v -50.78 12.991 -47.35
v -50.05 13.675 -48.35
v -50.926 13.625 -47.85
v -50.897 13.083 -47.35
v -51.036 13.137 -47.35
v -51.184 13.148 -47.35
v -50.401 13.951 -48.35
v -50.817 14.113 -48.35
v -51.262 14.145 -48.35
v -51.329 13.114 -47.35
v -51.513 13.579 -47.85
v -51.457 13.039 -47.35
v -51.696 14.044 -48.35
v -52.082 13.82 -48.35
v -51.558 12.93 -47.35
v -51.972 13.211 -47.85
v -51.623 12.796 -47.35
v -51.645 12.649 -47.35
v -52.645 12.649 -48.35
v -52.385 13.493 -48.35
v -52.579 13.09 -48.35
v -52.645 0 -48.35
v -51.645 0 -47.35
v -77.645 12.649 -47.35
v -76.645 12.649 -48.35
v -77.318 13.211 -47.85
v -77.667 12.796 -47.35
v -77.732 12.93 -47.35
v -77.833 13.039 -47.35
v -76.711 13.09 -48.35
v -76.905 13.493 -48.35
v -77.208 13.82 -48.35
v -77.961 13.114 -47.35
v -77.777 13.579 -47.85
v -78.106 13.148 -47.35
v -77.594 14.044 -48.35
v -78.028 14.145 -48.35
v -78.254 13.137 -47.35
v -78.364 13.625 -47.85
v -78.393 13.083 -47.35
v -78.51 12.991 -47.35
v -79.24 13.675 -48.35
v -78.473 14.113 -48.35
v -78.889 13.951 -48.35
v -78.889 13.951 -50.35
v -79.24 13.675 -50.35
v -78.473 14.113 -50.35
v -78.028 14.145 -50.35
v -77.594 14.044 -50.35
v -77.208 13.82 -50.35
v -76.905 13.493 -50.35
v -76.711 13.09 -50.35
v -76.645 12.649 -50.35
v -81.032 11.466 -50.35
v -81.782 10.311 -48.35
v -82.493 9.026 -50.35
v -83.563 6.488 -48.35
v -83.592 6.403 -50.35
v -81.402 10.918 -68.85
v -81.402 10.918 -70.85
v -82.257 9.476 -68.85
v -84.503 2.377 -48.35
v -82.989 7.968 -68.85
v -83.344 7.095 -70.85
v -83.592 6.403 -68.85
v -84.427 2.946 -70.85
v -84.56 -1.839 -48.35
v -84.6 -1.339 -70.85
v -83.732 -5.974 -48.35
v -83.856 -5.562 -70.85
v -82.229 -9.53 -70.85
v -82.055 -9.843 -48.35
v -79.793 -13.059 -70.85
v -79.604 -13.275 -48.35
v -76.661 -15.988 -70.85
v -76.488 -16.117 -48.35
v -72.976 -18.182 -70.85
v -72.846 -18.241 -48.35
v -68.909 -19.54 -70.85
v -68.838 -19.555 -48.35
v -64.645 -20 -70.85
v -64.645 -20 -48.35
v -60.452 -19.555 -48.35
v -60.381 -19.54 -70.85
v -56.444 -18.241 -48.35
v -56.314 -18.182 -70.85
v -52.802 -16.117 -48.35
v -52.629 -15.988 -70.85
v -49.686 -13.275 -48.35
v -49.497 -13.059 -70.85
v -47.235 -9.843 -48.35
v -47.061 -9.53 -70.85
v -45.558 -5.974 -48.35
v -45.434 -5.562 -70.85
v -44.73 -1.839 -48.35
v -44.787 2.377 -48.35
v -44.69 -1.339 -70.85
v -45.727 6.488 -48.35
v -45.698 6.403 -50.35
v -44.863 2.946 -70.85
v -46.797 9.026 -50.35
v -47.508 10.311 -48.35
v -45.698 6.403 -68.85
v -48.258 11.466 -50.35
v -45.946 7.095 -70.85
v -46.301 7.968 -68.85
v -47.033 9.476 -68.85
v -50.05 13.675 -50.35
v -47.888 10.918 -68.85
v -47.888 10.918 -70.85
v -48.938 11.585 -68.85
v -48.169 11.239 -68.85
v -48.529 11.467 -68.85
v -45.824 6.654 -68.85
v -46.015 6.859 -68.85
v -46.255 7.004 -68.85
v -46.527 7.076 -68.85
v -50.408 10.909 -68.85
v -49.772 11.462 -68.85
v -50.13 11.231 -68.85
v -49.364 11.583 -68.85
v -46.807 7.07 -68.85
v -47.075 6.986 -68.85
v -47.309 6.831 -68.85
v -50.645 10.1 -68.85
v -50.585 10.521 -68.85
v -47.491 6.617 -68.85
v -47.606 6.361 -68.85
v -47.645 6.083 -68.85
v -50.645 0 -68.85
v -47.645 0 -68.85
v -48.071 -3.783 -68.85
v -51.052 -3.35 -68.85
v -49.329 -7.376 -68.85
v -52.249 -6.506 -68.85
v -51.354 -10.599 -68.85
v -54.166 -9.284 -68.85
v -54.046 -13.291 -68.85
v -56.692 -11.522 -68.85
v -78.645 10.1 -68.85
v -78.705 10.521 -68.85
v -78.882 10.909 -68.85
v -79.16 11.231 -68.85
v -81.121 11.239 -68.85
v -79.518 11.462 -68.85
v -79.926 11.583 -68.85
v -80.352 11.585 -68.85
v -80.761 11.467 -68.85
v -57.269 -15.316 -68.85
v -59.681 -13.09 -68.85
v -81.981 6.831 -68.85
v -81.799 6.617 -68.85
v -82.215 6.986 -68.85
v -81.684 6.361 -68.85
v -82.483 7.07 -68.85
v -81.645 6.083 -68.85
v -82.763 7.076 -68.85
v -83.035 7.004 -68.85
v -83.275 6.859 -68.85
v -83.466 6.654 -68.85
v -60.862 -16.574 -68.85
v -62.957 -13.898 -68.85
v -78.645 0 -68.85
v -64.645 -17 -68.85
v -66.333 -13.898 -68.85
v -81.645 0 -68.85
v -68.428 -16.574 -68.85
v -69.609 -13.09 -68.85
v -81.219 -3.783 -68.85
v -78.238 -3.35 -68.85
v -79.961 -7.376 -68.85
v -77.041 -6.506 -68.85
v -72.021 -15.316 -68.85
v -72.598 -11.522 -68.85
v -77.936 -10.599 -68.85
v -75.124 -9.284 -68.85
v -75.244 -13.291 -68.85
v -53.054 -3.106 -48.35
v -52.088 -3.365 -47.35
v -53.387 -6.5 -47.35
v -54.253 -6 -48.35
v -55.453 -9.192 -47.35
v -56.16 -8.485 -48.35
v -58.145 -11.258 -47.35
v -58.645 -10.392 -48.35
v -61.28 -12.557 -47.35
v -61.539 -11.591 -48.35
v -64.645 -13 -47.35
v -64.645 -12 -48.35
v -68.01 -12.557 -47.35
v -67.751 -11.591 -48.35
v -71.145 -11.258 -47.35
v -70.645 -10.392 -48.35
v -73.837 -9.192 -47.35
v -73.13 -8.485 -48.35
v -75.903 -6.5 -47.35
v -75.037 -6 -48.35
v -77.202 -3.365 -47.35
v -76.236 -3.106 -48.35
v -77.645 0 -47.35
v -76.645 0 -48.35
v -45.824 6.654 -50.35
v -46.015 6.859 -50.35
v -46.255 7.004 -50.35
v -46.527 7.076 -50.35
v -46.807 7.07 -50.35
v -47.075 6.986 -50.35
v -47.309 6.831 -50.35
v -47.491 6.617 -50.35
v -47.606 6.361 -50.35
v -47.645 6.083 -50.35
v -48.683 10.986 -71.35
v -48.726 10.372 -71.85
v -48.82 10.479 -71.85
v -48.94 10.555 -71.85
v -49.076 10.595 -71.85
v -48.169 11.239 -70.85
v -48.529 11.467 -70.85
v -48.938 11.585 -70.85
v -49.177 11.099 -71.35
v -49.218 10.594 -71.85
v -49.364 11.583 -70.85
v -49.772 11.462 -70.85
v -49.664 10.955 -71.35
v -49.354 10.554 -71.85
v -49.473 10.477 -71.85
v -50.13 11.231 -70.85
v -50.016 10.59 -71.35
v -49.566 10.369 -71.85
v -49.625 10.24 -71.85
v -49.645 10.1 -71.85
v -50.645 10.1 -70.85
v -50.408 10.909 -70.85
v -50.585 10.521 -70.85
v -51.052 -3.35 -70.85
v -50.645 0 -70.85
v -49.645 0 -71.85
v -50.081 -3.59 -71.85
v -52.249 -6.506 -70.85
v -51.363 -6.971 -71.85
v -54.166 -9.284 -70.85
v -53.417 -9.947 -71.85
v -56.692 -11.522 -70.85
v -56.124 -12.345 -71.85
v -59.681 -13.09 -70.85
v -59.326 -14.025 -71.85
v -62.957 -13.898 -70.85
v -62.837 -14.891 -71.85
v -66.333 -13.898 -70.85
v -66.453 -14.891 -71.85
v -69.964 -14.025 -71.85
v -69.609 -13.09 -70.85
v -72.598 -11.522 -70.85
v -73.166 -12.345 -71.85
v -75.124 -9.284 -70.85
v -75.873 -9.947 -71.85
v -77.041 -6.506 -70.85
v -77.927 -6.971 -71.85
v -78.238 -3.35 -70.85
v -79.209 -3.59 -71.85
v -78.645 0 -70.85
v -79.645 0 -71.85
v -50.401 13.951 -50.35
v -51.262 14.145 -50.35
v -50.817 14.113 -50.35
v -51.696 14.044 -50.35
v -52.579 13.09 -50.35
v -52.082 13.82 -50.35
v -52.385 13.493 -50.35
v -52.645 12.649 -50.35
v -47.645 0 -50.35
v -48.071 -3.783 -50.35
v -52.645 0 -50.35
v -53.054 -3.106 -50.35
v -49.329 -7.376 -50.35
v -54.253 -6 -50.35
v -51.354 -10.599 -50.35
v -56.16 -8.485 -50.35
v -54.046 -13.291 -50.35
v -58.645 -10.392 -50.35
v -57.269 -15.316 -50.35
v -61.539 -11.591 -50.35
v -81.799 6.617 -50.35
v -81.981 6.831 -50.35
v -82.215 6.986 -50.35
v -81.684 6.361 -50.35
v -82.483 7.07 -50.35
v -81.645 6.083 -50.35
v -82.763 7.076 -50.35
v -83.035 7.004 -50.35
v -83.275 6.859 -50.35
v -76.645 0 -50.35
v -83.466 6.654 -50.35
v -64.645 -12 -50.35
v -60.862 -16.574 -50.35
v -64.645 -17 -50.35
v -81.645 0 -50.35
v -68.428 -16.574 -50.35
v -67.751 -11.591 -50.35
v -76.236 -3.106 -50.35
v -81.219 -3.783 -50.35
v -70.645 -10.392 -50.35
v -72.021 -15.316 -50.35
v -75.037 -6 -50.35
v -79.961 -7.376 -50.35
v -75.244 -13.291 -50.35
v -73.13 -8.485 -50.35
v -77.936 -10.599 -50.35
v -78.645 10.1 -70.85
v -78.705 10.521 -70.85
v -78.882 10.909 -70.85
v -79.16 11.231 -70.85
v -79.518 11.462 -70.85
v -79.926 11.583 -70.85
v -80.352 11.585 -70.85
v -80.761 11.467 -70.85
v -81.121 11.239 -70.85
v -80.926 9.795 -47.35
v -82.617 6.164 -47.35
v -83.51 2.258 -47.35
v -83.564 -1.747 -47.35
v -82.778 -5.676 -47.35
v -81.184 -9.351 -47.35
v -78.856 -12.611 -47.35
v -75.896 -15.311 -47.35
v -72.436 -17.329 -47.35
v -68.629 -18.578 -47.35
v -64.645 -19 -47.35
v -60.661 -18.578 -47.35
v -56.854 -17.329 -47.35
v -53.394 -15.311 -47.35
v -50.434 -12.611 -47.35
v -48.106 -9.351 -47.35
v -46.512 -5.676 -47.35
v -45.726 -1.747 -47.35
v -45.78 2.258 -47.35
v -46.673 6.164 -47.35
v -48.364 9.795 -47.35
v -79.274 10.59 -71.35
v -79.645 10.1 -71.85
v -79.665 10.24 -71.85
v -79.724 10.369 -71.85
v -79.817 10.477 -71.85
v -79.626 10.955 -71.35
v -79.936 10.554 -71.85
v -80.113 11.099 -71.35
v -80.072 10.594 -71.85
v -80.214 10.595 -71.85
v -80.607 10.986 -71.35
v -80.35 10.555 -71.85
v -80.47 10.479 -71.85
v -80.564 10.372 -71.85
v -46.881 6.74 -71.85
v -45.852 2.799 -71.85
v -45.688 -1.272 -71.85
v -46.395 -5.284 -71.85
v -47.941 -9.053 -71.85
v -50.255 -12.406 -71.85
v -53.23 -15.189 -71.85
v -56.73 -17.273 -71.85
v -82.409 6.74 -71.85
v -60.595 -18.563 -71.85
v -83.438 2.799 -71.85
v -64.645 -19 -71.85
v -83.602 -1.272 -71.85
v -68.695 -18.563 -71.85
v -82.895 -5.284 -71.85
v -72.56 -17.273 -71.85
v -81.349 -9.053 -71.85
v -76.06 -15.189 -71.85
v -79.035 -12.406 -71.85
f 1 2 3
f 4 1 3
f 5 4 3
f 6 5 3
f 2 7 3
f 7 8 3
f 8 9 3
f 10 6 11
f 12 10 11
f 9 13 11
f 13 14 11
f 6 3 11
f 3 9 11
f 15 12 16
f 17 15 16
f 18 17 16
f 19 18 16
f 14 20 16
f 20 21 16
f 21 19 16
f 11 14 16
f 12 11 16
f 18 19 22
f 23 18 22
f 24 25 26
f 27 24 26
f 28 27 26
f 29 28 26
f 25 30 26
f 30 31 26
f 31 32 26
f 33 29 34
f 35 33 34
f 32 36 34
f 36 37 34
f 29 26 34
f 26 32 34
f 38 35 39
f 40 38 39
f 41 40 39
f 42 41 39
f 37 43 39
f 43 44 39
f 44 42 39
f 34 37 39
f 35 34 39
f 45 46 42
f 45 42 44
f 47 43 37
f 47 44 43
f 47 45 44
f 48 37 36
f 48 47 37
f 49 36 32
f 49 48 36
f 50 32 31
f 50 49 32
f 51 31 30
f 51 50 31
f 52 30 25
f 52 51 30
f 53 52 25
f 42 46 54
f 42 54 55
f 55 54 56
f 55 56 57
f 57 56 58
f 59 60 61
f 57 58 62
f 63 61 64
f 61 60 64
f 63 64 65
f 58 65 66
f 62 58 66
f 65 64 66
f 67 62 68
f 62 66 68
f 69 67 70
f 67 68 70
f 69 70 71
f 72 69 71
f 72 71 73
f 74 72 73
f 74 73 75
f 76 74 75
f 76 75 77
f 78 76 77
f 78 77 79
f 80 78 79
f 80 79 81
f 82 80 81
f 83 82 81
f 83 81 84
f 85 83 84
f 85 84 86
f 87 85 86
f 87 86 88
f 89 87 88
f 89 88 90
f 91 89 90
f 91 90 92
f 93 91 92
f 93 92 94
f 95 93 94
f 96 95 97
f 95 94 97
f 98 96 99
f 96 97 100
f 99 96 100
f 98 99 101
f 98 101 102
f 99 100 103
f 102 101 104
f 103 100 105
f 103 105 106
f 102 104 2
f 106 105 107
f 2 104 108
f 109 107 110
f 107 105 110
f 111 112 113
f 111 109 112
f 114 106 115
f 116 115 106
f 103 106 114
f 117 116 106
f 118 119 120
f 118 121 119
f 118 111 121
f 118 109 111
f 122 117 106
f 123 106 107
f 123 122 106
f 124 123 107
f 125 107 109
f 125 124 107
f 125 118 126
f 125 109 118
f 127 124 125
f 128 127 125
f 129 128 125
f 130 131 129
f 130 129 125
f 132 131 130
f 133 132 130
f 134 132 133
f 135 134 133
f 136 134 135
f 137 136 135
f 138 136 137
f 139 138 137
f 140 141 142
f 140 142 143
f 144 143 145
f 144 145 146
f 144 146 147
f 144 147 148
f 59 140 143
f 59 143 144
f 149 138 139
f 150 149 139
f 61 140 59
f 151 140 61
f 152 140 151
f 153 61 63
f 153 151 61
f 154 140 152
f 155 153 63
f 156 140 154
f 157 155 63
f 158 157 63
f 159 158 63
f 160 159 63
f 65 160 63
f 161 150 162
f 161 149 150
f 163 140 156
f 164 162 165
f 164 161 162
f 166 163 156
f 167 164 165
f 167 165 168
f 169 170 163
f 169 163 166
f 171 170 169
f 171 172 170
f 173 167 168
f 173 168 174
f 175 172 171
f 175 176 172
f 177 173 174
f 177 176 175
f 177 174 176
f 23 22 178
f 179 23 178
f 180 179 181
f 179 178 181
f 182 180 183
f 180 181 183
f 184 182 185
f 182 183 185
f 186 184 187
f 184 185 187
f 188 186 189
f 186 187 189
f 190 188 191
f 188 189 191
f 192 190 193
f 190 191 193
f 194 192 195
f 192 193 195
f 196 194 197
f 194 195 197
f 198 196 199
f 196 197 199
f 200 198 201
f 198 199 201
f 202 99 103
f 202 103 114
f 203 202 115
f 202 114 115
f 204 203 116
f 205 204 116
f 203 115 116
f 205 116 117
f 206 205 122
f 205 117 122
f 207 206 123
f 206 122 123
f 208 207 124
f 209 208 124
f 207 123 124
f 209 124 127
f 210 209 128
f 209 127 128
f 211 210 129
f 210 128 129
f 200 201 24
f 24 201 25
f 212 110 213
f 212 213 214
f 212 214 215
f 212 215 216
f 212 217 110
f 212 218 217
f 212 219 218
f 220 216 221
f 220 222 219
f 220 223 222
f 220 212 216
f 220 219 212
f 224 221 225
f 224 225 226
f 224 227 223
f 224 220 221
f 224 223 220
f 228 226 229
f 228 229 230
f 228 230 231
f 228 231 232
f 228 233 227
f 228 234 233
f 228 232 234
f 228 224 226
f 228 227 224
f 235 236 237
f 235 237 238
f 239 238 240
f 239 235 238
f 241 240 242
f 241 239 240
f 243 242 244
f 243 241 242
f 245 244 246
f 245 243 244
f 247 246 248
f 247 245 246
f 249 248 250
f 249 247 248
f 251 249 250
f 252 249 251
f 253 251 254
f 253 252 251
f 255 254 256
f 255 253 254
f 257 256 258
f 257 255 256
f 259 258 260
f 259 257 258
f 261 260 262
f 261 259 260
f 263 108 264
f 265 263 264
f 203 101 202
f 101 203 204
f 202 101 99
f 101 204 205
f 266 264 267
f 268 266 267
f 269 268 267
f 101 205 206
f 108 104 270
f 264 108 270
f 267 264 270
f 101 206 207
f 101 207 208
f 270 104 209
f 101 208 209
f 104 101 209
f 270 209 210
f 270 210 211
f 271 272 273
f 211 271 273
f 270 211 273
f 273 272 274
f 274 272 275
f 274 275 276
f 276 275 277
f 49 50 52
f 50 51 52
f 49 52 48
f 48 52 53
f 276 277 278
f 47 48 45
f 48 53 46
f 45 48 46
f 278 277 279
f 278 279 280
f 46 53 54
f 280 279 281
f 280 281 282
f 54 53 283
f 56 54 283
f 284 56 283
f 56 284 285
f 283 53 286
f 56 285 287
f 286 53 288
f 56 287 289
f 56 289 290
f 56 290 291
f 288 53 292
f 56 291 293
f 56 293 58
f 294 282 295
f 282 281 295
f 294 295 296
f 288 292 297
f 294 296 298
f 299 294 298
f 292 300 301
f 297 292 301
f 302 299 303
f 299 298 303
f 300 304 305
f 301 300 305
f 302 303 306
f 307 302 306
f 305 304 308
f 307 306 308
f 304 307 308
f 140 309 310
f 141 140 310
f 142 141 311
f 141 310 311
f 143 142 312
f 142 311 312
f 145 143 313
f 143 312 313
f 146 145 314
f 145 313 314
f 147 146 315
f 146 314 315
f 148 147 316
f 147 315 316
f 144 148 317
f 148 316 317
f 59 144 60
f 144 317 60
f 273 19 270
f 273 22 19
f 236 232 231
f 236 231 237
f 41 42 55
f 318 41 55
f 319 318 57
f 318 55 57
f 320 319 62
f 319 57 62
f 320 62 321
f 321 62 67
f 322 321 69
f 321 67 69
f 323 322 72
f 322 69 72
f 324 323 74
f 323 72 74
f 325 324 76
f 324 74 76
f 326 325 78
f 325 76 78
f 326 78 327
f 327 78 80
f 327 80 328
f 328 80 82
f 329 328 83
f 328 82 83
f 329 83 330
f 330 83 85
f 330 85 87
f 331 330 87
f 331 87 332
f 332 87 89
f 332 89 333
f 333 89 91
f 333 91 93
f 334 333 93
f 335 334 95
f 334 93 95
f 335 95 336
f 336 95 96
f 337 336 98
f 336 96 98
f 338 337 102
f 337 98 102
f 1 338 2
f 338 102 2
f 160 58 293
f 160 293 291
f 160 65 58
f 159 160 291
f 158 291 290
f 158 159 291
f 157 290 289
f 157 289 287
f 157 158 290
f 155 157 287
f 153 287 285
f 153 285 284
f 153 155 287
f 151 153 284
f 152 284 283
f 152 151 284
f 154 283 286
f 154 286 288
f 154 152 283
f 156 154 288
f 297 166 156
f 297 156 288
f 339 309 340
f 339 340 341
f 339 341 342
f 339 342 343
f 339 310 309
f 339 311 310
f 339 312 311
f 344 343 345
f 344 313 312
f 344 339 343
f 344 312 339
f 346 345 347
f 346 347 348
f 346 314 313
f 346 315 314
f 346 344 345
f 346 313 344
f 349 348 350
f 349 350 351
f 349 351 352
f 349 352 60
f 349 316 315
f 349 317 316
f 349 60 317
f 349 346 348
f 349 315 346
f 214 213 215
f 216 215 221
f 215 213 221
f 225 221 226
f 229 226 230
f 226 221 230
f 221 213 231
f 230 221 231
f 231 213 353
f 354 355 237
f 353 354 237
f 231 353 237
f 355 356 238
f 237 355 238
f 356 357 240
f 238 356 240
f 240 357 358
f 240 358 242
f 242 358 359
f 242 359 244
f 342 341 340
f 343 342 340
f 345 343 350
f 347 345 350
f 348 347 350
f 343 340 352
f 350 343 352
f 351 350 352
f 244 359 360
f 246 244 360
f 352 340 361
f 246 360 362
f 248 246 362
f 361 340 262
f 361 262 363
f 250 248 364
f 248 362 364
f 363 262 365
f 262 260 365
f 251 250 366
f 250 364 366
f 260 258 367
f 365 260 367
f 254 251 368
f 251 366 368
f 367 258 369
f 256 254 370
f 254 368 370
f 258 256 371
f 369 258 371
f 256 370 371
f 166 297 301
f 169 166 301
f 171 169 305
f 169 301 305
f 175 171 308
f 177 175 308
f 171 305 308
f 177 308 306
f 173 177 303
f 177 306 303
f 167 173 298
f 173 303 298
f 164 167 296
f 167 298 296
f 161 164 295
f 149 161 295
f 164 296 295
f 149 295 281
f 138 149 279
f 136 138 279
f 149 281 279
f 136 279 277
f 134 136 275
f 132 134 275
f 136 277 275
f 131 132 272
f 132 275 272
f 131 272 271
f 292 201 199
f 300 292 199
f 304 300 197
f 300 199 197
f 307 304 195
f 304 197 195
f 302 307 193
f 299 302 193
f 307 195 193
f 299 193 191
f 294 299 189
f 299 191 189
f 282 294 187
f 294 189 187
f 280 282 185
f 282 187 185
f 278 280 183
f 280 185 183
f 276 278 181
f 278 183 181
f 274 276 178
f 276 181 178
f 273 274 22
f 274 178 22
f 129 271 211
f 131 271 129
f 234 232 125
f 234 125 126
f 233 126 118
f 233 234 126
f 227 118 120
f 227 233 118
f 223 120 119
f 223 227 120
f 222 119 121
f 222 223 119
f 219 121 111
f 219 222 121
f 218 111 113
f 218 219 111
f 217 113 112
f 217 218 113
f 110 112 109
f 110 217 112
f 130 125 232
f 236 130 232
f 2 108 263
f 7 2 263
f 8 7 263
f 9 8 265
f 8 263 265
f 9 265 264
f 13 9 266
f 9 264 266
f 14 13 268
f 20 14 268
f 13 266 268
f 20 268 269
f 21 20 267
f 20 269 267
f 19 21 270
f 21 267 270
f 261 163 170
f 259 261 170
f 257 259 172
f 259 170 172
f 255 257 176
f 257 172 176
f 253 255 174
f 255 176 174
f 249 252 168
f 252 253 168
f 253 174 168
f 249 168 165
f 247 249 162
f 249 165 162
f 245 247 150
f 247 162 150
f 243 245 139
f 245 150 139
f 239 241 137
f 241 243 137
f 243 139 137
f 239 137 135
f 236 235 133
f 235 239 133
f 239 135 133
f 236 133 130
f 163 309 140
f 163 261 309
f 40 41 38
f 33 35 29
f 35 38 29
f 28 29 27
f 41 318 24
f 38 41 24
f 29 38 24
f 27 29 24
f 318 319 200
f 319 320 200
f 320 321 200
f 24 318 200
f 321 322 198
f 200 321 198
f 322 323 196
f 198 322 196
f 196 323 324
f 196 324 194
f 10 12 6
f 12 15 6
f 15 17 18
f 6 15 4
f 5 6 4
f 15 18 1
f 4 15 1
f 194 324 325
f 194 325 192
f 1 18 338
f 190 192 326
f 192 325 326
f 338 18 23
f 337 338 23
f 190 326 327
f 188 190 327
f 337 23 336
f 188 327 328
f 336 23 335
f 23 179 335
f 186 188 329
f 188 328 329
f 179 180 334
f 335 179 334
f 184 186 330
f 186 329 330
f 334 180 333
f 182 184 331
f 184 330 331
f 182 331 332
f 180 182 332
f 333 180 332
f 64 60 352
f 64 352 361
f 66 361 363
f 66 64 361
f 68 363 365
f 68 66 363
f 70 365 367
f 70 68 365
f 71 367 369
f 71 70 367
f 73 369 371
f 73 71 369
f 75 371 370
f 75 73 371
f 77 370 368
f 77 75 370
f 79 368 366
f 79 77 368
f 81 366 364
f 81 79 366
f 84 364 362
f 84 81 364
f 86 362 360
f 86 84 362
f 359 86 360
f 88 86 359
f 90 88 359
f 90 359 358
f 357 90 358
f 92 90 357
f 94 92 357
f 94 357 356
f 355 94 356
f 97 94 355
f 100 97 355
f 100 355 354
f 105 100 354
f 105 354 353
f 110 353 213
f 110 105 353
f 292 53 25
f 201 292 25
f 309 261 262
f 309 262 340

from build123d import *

# Parameters (mm, degrees)
POCKET003_DEPTH = 20.001
FILLET_R        = 1.5
FILLET001_R     = 1
CHAMFER001_SIZE = 1


with BuildPart() as part:
    # Sketch013 → Revolution003 (revolve)
    with BuildSketch(Plane.XZ):
        Polygon((-76.645, -50.35), (-76.645, -47.35), (-84.645, -47.35), (-84.645, -71.85), (-78.645, -71.85), (-78.645, -68.85), (-81.645, -68.85), (-81.645, -50.35), align=None)
    revolve(axis=Axis((-64.645, 0, -50.35), (0, 0, 1)))

    # Sketch014 → Pocket003 (cut, through all)
    with BuildSketch(Plane.XZ):
        Polygon((-76.645, -47.35), (-52.645, -47.35), (-52.645, -50.35), (-47.645, -50.35), (-47.645, -68.85), (-50.645, -68.85), (-50.645, -71.85), (-78.645, -71.85), (-78.645, -68.85), (-81.645, -68.85), (-81.645, -50.35), (-76.645, -50.35), align=None)
    extrude(amount=-POCKET003_DEPTH, mode=Mode.SUBTRACT)

    # Fillet
    fillet_edges = [part.edges().sort_by_distance(p)[0] for p in [
        (-52.645, 16, -48.85),
        (-76.645, 16, -48.85),
        (-78.645, 14.282857, -70.35),
        (-50.645, 14.282857, -70.35),
    ]]
    fillet(fillet_edges, radius=FILLET_R)

    # Fillet001
    fillet001_edges = [part.edges().sort_by_distance(p)[0] for p in [
        (-47.645, 10.535654, -59.6),
        (-81.645, 10.535654, -59.6),
    ]]
    fillet(fillet001_edges, radius=FILLET001_R)

    # Chamfer001
    chamfer001_edges = [part.edges().sort_by_distance(p)[0] for p in [
        (-83.244622, 7.352146, -47.35),
        (-83.817052, 5.694948, -71.85),
    ]]
    chamfer(chamfer001_edges, length=CHAMFER001_SIZE)


solid = part.part
